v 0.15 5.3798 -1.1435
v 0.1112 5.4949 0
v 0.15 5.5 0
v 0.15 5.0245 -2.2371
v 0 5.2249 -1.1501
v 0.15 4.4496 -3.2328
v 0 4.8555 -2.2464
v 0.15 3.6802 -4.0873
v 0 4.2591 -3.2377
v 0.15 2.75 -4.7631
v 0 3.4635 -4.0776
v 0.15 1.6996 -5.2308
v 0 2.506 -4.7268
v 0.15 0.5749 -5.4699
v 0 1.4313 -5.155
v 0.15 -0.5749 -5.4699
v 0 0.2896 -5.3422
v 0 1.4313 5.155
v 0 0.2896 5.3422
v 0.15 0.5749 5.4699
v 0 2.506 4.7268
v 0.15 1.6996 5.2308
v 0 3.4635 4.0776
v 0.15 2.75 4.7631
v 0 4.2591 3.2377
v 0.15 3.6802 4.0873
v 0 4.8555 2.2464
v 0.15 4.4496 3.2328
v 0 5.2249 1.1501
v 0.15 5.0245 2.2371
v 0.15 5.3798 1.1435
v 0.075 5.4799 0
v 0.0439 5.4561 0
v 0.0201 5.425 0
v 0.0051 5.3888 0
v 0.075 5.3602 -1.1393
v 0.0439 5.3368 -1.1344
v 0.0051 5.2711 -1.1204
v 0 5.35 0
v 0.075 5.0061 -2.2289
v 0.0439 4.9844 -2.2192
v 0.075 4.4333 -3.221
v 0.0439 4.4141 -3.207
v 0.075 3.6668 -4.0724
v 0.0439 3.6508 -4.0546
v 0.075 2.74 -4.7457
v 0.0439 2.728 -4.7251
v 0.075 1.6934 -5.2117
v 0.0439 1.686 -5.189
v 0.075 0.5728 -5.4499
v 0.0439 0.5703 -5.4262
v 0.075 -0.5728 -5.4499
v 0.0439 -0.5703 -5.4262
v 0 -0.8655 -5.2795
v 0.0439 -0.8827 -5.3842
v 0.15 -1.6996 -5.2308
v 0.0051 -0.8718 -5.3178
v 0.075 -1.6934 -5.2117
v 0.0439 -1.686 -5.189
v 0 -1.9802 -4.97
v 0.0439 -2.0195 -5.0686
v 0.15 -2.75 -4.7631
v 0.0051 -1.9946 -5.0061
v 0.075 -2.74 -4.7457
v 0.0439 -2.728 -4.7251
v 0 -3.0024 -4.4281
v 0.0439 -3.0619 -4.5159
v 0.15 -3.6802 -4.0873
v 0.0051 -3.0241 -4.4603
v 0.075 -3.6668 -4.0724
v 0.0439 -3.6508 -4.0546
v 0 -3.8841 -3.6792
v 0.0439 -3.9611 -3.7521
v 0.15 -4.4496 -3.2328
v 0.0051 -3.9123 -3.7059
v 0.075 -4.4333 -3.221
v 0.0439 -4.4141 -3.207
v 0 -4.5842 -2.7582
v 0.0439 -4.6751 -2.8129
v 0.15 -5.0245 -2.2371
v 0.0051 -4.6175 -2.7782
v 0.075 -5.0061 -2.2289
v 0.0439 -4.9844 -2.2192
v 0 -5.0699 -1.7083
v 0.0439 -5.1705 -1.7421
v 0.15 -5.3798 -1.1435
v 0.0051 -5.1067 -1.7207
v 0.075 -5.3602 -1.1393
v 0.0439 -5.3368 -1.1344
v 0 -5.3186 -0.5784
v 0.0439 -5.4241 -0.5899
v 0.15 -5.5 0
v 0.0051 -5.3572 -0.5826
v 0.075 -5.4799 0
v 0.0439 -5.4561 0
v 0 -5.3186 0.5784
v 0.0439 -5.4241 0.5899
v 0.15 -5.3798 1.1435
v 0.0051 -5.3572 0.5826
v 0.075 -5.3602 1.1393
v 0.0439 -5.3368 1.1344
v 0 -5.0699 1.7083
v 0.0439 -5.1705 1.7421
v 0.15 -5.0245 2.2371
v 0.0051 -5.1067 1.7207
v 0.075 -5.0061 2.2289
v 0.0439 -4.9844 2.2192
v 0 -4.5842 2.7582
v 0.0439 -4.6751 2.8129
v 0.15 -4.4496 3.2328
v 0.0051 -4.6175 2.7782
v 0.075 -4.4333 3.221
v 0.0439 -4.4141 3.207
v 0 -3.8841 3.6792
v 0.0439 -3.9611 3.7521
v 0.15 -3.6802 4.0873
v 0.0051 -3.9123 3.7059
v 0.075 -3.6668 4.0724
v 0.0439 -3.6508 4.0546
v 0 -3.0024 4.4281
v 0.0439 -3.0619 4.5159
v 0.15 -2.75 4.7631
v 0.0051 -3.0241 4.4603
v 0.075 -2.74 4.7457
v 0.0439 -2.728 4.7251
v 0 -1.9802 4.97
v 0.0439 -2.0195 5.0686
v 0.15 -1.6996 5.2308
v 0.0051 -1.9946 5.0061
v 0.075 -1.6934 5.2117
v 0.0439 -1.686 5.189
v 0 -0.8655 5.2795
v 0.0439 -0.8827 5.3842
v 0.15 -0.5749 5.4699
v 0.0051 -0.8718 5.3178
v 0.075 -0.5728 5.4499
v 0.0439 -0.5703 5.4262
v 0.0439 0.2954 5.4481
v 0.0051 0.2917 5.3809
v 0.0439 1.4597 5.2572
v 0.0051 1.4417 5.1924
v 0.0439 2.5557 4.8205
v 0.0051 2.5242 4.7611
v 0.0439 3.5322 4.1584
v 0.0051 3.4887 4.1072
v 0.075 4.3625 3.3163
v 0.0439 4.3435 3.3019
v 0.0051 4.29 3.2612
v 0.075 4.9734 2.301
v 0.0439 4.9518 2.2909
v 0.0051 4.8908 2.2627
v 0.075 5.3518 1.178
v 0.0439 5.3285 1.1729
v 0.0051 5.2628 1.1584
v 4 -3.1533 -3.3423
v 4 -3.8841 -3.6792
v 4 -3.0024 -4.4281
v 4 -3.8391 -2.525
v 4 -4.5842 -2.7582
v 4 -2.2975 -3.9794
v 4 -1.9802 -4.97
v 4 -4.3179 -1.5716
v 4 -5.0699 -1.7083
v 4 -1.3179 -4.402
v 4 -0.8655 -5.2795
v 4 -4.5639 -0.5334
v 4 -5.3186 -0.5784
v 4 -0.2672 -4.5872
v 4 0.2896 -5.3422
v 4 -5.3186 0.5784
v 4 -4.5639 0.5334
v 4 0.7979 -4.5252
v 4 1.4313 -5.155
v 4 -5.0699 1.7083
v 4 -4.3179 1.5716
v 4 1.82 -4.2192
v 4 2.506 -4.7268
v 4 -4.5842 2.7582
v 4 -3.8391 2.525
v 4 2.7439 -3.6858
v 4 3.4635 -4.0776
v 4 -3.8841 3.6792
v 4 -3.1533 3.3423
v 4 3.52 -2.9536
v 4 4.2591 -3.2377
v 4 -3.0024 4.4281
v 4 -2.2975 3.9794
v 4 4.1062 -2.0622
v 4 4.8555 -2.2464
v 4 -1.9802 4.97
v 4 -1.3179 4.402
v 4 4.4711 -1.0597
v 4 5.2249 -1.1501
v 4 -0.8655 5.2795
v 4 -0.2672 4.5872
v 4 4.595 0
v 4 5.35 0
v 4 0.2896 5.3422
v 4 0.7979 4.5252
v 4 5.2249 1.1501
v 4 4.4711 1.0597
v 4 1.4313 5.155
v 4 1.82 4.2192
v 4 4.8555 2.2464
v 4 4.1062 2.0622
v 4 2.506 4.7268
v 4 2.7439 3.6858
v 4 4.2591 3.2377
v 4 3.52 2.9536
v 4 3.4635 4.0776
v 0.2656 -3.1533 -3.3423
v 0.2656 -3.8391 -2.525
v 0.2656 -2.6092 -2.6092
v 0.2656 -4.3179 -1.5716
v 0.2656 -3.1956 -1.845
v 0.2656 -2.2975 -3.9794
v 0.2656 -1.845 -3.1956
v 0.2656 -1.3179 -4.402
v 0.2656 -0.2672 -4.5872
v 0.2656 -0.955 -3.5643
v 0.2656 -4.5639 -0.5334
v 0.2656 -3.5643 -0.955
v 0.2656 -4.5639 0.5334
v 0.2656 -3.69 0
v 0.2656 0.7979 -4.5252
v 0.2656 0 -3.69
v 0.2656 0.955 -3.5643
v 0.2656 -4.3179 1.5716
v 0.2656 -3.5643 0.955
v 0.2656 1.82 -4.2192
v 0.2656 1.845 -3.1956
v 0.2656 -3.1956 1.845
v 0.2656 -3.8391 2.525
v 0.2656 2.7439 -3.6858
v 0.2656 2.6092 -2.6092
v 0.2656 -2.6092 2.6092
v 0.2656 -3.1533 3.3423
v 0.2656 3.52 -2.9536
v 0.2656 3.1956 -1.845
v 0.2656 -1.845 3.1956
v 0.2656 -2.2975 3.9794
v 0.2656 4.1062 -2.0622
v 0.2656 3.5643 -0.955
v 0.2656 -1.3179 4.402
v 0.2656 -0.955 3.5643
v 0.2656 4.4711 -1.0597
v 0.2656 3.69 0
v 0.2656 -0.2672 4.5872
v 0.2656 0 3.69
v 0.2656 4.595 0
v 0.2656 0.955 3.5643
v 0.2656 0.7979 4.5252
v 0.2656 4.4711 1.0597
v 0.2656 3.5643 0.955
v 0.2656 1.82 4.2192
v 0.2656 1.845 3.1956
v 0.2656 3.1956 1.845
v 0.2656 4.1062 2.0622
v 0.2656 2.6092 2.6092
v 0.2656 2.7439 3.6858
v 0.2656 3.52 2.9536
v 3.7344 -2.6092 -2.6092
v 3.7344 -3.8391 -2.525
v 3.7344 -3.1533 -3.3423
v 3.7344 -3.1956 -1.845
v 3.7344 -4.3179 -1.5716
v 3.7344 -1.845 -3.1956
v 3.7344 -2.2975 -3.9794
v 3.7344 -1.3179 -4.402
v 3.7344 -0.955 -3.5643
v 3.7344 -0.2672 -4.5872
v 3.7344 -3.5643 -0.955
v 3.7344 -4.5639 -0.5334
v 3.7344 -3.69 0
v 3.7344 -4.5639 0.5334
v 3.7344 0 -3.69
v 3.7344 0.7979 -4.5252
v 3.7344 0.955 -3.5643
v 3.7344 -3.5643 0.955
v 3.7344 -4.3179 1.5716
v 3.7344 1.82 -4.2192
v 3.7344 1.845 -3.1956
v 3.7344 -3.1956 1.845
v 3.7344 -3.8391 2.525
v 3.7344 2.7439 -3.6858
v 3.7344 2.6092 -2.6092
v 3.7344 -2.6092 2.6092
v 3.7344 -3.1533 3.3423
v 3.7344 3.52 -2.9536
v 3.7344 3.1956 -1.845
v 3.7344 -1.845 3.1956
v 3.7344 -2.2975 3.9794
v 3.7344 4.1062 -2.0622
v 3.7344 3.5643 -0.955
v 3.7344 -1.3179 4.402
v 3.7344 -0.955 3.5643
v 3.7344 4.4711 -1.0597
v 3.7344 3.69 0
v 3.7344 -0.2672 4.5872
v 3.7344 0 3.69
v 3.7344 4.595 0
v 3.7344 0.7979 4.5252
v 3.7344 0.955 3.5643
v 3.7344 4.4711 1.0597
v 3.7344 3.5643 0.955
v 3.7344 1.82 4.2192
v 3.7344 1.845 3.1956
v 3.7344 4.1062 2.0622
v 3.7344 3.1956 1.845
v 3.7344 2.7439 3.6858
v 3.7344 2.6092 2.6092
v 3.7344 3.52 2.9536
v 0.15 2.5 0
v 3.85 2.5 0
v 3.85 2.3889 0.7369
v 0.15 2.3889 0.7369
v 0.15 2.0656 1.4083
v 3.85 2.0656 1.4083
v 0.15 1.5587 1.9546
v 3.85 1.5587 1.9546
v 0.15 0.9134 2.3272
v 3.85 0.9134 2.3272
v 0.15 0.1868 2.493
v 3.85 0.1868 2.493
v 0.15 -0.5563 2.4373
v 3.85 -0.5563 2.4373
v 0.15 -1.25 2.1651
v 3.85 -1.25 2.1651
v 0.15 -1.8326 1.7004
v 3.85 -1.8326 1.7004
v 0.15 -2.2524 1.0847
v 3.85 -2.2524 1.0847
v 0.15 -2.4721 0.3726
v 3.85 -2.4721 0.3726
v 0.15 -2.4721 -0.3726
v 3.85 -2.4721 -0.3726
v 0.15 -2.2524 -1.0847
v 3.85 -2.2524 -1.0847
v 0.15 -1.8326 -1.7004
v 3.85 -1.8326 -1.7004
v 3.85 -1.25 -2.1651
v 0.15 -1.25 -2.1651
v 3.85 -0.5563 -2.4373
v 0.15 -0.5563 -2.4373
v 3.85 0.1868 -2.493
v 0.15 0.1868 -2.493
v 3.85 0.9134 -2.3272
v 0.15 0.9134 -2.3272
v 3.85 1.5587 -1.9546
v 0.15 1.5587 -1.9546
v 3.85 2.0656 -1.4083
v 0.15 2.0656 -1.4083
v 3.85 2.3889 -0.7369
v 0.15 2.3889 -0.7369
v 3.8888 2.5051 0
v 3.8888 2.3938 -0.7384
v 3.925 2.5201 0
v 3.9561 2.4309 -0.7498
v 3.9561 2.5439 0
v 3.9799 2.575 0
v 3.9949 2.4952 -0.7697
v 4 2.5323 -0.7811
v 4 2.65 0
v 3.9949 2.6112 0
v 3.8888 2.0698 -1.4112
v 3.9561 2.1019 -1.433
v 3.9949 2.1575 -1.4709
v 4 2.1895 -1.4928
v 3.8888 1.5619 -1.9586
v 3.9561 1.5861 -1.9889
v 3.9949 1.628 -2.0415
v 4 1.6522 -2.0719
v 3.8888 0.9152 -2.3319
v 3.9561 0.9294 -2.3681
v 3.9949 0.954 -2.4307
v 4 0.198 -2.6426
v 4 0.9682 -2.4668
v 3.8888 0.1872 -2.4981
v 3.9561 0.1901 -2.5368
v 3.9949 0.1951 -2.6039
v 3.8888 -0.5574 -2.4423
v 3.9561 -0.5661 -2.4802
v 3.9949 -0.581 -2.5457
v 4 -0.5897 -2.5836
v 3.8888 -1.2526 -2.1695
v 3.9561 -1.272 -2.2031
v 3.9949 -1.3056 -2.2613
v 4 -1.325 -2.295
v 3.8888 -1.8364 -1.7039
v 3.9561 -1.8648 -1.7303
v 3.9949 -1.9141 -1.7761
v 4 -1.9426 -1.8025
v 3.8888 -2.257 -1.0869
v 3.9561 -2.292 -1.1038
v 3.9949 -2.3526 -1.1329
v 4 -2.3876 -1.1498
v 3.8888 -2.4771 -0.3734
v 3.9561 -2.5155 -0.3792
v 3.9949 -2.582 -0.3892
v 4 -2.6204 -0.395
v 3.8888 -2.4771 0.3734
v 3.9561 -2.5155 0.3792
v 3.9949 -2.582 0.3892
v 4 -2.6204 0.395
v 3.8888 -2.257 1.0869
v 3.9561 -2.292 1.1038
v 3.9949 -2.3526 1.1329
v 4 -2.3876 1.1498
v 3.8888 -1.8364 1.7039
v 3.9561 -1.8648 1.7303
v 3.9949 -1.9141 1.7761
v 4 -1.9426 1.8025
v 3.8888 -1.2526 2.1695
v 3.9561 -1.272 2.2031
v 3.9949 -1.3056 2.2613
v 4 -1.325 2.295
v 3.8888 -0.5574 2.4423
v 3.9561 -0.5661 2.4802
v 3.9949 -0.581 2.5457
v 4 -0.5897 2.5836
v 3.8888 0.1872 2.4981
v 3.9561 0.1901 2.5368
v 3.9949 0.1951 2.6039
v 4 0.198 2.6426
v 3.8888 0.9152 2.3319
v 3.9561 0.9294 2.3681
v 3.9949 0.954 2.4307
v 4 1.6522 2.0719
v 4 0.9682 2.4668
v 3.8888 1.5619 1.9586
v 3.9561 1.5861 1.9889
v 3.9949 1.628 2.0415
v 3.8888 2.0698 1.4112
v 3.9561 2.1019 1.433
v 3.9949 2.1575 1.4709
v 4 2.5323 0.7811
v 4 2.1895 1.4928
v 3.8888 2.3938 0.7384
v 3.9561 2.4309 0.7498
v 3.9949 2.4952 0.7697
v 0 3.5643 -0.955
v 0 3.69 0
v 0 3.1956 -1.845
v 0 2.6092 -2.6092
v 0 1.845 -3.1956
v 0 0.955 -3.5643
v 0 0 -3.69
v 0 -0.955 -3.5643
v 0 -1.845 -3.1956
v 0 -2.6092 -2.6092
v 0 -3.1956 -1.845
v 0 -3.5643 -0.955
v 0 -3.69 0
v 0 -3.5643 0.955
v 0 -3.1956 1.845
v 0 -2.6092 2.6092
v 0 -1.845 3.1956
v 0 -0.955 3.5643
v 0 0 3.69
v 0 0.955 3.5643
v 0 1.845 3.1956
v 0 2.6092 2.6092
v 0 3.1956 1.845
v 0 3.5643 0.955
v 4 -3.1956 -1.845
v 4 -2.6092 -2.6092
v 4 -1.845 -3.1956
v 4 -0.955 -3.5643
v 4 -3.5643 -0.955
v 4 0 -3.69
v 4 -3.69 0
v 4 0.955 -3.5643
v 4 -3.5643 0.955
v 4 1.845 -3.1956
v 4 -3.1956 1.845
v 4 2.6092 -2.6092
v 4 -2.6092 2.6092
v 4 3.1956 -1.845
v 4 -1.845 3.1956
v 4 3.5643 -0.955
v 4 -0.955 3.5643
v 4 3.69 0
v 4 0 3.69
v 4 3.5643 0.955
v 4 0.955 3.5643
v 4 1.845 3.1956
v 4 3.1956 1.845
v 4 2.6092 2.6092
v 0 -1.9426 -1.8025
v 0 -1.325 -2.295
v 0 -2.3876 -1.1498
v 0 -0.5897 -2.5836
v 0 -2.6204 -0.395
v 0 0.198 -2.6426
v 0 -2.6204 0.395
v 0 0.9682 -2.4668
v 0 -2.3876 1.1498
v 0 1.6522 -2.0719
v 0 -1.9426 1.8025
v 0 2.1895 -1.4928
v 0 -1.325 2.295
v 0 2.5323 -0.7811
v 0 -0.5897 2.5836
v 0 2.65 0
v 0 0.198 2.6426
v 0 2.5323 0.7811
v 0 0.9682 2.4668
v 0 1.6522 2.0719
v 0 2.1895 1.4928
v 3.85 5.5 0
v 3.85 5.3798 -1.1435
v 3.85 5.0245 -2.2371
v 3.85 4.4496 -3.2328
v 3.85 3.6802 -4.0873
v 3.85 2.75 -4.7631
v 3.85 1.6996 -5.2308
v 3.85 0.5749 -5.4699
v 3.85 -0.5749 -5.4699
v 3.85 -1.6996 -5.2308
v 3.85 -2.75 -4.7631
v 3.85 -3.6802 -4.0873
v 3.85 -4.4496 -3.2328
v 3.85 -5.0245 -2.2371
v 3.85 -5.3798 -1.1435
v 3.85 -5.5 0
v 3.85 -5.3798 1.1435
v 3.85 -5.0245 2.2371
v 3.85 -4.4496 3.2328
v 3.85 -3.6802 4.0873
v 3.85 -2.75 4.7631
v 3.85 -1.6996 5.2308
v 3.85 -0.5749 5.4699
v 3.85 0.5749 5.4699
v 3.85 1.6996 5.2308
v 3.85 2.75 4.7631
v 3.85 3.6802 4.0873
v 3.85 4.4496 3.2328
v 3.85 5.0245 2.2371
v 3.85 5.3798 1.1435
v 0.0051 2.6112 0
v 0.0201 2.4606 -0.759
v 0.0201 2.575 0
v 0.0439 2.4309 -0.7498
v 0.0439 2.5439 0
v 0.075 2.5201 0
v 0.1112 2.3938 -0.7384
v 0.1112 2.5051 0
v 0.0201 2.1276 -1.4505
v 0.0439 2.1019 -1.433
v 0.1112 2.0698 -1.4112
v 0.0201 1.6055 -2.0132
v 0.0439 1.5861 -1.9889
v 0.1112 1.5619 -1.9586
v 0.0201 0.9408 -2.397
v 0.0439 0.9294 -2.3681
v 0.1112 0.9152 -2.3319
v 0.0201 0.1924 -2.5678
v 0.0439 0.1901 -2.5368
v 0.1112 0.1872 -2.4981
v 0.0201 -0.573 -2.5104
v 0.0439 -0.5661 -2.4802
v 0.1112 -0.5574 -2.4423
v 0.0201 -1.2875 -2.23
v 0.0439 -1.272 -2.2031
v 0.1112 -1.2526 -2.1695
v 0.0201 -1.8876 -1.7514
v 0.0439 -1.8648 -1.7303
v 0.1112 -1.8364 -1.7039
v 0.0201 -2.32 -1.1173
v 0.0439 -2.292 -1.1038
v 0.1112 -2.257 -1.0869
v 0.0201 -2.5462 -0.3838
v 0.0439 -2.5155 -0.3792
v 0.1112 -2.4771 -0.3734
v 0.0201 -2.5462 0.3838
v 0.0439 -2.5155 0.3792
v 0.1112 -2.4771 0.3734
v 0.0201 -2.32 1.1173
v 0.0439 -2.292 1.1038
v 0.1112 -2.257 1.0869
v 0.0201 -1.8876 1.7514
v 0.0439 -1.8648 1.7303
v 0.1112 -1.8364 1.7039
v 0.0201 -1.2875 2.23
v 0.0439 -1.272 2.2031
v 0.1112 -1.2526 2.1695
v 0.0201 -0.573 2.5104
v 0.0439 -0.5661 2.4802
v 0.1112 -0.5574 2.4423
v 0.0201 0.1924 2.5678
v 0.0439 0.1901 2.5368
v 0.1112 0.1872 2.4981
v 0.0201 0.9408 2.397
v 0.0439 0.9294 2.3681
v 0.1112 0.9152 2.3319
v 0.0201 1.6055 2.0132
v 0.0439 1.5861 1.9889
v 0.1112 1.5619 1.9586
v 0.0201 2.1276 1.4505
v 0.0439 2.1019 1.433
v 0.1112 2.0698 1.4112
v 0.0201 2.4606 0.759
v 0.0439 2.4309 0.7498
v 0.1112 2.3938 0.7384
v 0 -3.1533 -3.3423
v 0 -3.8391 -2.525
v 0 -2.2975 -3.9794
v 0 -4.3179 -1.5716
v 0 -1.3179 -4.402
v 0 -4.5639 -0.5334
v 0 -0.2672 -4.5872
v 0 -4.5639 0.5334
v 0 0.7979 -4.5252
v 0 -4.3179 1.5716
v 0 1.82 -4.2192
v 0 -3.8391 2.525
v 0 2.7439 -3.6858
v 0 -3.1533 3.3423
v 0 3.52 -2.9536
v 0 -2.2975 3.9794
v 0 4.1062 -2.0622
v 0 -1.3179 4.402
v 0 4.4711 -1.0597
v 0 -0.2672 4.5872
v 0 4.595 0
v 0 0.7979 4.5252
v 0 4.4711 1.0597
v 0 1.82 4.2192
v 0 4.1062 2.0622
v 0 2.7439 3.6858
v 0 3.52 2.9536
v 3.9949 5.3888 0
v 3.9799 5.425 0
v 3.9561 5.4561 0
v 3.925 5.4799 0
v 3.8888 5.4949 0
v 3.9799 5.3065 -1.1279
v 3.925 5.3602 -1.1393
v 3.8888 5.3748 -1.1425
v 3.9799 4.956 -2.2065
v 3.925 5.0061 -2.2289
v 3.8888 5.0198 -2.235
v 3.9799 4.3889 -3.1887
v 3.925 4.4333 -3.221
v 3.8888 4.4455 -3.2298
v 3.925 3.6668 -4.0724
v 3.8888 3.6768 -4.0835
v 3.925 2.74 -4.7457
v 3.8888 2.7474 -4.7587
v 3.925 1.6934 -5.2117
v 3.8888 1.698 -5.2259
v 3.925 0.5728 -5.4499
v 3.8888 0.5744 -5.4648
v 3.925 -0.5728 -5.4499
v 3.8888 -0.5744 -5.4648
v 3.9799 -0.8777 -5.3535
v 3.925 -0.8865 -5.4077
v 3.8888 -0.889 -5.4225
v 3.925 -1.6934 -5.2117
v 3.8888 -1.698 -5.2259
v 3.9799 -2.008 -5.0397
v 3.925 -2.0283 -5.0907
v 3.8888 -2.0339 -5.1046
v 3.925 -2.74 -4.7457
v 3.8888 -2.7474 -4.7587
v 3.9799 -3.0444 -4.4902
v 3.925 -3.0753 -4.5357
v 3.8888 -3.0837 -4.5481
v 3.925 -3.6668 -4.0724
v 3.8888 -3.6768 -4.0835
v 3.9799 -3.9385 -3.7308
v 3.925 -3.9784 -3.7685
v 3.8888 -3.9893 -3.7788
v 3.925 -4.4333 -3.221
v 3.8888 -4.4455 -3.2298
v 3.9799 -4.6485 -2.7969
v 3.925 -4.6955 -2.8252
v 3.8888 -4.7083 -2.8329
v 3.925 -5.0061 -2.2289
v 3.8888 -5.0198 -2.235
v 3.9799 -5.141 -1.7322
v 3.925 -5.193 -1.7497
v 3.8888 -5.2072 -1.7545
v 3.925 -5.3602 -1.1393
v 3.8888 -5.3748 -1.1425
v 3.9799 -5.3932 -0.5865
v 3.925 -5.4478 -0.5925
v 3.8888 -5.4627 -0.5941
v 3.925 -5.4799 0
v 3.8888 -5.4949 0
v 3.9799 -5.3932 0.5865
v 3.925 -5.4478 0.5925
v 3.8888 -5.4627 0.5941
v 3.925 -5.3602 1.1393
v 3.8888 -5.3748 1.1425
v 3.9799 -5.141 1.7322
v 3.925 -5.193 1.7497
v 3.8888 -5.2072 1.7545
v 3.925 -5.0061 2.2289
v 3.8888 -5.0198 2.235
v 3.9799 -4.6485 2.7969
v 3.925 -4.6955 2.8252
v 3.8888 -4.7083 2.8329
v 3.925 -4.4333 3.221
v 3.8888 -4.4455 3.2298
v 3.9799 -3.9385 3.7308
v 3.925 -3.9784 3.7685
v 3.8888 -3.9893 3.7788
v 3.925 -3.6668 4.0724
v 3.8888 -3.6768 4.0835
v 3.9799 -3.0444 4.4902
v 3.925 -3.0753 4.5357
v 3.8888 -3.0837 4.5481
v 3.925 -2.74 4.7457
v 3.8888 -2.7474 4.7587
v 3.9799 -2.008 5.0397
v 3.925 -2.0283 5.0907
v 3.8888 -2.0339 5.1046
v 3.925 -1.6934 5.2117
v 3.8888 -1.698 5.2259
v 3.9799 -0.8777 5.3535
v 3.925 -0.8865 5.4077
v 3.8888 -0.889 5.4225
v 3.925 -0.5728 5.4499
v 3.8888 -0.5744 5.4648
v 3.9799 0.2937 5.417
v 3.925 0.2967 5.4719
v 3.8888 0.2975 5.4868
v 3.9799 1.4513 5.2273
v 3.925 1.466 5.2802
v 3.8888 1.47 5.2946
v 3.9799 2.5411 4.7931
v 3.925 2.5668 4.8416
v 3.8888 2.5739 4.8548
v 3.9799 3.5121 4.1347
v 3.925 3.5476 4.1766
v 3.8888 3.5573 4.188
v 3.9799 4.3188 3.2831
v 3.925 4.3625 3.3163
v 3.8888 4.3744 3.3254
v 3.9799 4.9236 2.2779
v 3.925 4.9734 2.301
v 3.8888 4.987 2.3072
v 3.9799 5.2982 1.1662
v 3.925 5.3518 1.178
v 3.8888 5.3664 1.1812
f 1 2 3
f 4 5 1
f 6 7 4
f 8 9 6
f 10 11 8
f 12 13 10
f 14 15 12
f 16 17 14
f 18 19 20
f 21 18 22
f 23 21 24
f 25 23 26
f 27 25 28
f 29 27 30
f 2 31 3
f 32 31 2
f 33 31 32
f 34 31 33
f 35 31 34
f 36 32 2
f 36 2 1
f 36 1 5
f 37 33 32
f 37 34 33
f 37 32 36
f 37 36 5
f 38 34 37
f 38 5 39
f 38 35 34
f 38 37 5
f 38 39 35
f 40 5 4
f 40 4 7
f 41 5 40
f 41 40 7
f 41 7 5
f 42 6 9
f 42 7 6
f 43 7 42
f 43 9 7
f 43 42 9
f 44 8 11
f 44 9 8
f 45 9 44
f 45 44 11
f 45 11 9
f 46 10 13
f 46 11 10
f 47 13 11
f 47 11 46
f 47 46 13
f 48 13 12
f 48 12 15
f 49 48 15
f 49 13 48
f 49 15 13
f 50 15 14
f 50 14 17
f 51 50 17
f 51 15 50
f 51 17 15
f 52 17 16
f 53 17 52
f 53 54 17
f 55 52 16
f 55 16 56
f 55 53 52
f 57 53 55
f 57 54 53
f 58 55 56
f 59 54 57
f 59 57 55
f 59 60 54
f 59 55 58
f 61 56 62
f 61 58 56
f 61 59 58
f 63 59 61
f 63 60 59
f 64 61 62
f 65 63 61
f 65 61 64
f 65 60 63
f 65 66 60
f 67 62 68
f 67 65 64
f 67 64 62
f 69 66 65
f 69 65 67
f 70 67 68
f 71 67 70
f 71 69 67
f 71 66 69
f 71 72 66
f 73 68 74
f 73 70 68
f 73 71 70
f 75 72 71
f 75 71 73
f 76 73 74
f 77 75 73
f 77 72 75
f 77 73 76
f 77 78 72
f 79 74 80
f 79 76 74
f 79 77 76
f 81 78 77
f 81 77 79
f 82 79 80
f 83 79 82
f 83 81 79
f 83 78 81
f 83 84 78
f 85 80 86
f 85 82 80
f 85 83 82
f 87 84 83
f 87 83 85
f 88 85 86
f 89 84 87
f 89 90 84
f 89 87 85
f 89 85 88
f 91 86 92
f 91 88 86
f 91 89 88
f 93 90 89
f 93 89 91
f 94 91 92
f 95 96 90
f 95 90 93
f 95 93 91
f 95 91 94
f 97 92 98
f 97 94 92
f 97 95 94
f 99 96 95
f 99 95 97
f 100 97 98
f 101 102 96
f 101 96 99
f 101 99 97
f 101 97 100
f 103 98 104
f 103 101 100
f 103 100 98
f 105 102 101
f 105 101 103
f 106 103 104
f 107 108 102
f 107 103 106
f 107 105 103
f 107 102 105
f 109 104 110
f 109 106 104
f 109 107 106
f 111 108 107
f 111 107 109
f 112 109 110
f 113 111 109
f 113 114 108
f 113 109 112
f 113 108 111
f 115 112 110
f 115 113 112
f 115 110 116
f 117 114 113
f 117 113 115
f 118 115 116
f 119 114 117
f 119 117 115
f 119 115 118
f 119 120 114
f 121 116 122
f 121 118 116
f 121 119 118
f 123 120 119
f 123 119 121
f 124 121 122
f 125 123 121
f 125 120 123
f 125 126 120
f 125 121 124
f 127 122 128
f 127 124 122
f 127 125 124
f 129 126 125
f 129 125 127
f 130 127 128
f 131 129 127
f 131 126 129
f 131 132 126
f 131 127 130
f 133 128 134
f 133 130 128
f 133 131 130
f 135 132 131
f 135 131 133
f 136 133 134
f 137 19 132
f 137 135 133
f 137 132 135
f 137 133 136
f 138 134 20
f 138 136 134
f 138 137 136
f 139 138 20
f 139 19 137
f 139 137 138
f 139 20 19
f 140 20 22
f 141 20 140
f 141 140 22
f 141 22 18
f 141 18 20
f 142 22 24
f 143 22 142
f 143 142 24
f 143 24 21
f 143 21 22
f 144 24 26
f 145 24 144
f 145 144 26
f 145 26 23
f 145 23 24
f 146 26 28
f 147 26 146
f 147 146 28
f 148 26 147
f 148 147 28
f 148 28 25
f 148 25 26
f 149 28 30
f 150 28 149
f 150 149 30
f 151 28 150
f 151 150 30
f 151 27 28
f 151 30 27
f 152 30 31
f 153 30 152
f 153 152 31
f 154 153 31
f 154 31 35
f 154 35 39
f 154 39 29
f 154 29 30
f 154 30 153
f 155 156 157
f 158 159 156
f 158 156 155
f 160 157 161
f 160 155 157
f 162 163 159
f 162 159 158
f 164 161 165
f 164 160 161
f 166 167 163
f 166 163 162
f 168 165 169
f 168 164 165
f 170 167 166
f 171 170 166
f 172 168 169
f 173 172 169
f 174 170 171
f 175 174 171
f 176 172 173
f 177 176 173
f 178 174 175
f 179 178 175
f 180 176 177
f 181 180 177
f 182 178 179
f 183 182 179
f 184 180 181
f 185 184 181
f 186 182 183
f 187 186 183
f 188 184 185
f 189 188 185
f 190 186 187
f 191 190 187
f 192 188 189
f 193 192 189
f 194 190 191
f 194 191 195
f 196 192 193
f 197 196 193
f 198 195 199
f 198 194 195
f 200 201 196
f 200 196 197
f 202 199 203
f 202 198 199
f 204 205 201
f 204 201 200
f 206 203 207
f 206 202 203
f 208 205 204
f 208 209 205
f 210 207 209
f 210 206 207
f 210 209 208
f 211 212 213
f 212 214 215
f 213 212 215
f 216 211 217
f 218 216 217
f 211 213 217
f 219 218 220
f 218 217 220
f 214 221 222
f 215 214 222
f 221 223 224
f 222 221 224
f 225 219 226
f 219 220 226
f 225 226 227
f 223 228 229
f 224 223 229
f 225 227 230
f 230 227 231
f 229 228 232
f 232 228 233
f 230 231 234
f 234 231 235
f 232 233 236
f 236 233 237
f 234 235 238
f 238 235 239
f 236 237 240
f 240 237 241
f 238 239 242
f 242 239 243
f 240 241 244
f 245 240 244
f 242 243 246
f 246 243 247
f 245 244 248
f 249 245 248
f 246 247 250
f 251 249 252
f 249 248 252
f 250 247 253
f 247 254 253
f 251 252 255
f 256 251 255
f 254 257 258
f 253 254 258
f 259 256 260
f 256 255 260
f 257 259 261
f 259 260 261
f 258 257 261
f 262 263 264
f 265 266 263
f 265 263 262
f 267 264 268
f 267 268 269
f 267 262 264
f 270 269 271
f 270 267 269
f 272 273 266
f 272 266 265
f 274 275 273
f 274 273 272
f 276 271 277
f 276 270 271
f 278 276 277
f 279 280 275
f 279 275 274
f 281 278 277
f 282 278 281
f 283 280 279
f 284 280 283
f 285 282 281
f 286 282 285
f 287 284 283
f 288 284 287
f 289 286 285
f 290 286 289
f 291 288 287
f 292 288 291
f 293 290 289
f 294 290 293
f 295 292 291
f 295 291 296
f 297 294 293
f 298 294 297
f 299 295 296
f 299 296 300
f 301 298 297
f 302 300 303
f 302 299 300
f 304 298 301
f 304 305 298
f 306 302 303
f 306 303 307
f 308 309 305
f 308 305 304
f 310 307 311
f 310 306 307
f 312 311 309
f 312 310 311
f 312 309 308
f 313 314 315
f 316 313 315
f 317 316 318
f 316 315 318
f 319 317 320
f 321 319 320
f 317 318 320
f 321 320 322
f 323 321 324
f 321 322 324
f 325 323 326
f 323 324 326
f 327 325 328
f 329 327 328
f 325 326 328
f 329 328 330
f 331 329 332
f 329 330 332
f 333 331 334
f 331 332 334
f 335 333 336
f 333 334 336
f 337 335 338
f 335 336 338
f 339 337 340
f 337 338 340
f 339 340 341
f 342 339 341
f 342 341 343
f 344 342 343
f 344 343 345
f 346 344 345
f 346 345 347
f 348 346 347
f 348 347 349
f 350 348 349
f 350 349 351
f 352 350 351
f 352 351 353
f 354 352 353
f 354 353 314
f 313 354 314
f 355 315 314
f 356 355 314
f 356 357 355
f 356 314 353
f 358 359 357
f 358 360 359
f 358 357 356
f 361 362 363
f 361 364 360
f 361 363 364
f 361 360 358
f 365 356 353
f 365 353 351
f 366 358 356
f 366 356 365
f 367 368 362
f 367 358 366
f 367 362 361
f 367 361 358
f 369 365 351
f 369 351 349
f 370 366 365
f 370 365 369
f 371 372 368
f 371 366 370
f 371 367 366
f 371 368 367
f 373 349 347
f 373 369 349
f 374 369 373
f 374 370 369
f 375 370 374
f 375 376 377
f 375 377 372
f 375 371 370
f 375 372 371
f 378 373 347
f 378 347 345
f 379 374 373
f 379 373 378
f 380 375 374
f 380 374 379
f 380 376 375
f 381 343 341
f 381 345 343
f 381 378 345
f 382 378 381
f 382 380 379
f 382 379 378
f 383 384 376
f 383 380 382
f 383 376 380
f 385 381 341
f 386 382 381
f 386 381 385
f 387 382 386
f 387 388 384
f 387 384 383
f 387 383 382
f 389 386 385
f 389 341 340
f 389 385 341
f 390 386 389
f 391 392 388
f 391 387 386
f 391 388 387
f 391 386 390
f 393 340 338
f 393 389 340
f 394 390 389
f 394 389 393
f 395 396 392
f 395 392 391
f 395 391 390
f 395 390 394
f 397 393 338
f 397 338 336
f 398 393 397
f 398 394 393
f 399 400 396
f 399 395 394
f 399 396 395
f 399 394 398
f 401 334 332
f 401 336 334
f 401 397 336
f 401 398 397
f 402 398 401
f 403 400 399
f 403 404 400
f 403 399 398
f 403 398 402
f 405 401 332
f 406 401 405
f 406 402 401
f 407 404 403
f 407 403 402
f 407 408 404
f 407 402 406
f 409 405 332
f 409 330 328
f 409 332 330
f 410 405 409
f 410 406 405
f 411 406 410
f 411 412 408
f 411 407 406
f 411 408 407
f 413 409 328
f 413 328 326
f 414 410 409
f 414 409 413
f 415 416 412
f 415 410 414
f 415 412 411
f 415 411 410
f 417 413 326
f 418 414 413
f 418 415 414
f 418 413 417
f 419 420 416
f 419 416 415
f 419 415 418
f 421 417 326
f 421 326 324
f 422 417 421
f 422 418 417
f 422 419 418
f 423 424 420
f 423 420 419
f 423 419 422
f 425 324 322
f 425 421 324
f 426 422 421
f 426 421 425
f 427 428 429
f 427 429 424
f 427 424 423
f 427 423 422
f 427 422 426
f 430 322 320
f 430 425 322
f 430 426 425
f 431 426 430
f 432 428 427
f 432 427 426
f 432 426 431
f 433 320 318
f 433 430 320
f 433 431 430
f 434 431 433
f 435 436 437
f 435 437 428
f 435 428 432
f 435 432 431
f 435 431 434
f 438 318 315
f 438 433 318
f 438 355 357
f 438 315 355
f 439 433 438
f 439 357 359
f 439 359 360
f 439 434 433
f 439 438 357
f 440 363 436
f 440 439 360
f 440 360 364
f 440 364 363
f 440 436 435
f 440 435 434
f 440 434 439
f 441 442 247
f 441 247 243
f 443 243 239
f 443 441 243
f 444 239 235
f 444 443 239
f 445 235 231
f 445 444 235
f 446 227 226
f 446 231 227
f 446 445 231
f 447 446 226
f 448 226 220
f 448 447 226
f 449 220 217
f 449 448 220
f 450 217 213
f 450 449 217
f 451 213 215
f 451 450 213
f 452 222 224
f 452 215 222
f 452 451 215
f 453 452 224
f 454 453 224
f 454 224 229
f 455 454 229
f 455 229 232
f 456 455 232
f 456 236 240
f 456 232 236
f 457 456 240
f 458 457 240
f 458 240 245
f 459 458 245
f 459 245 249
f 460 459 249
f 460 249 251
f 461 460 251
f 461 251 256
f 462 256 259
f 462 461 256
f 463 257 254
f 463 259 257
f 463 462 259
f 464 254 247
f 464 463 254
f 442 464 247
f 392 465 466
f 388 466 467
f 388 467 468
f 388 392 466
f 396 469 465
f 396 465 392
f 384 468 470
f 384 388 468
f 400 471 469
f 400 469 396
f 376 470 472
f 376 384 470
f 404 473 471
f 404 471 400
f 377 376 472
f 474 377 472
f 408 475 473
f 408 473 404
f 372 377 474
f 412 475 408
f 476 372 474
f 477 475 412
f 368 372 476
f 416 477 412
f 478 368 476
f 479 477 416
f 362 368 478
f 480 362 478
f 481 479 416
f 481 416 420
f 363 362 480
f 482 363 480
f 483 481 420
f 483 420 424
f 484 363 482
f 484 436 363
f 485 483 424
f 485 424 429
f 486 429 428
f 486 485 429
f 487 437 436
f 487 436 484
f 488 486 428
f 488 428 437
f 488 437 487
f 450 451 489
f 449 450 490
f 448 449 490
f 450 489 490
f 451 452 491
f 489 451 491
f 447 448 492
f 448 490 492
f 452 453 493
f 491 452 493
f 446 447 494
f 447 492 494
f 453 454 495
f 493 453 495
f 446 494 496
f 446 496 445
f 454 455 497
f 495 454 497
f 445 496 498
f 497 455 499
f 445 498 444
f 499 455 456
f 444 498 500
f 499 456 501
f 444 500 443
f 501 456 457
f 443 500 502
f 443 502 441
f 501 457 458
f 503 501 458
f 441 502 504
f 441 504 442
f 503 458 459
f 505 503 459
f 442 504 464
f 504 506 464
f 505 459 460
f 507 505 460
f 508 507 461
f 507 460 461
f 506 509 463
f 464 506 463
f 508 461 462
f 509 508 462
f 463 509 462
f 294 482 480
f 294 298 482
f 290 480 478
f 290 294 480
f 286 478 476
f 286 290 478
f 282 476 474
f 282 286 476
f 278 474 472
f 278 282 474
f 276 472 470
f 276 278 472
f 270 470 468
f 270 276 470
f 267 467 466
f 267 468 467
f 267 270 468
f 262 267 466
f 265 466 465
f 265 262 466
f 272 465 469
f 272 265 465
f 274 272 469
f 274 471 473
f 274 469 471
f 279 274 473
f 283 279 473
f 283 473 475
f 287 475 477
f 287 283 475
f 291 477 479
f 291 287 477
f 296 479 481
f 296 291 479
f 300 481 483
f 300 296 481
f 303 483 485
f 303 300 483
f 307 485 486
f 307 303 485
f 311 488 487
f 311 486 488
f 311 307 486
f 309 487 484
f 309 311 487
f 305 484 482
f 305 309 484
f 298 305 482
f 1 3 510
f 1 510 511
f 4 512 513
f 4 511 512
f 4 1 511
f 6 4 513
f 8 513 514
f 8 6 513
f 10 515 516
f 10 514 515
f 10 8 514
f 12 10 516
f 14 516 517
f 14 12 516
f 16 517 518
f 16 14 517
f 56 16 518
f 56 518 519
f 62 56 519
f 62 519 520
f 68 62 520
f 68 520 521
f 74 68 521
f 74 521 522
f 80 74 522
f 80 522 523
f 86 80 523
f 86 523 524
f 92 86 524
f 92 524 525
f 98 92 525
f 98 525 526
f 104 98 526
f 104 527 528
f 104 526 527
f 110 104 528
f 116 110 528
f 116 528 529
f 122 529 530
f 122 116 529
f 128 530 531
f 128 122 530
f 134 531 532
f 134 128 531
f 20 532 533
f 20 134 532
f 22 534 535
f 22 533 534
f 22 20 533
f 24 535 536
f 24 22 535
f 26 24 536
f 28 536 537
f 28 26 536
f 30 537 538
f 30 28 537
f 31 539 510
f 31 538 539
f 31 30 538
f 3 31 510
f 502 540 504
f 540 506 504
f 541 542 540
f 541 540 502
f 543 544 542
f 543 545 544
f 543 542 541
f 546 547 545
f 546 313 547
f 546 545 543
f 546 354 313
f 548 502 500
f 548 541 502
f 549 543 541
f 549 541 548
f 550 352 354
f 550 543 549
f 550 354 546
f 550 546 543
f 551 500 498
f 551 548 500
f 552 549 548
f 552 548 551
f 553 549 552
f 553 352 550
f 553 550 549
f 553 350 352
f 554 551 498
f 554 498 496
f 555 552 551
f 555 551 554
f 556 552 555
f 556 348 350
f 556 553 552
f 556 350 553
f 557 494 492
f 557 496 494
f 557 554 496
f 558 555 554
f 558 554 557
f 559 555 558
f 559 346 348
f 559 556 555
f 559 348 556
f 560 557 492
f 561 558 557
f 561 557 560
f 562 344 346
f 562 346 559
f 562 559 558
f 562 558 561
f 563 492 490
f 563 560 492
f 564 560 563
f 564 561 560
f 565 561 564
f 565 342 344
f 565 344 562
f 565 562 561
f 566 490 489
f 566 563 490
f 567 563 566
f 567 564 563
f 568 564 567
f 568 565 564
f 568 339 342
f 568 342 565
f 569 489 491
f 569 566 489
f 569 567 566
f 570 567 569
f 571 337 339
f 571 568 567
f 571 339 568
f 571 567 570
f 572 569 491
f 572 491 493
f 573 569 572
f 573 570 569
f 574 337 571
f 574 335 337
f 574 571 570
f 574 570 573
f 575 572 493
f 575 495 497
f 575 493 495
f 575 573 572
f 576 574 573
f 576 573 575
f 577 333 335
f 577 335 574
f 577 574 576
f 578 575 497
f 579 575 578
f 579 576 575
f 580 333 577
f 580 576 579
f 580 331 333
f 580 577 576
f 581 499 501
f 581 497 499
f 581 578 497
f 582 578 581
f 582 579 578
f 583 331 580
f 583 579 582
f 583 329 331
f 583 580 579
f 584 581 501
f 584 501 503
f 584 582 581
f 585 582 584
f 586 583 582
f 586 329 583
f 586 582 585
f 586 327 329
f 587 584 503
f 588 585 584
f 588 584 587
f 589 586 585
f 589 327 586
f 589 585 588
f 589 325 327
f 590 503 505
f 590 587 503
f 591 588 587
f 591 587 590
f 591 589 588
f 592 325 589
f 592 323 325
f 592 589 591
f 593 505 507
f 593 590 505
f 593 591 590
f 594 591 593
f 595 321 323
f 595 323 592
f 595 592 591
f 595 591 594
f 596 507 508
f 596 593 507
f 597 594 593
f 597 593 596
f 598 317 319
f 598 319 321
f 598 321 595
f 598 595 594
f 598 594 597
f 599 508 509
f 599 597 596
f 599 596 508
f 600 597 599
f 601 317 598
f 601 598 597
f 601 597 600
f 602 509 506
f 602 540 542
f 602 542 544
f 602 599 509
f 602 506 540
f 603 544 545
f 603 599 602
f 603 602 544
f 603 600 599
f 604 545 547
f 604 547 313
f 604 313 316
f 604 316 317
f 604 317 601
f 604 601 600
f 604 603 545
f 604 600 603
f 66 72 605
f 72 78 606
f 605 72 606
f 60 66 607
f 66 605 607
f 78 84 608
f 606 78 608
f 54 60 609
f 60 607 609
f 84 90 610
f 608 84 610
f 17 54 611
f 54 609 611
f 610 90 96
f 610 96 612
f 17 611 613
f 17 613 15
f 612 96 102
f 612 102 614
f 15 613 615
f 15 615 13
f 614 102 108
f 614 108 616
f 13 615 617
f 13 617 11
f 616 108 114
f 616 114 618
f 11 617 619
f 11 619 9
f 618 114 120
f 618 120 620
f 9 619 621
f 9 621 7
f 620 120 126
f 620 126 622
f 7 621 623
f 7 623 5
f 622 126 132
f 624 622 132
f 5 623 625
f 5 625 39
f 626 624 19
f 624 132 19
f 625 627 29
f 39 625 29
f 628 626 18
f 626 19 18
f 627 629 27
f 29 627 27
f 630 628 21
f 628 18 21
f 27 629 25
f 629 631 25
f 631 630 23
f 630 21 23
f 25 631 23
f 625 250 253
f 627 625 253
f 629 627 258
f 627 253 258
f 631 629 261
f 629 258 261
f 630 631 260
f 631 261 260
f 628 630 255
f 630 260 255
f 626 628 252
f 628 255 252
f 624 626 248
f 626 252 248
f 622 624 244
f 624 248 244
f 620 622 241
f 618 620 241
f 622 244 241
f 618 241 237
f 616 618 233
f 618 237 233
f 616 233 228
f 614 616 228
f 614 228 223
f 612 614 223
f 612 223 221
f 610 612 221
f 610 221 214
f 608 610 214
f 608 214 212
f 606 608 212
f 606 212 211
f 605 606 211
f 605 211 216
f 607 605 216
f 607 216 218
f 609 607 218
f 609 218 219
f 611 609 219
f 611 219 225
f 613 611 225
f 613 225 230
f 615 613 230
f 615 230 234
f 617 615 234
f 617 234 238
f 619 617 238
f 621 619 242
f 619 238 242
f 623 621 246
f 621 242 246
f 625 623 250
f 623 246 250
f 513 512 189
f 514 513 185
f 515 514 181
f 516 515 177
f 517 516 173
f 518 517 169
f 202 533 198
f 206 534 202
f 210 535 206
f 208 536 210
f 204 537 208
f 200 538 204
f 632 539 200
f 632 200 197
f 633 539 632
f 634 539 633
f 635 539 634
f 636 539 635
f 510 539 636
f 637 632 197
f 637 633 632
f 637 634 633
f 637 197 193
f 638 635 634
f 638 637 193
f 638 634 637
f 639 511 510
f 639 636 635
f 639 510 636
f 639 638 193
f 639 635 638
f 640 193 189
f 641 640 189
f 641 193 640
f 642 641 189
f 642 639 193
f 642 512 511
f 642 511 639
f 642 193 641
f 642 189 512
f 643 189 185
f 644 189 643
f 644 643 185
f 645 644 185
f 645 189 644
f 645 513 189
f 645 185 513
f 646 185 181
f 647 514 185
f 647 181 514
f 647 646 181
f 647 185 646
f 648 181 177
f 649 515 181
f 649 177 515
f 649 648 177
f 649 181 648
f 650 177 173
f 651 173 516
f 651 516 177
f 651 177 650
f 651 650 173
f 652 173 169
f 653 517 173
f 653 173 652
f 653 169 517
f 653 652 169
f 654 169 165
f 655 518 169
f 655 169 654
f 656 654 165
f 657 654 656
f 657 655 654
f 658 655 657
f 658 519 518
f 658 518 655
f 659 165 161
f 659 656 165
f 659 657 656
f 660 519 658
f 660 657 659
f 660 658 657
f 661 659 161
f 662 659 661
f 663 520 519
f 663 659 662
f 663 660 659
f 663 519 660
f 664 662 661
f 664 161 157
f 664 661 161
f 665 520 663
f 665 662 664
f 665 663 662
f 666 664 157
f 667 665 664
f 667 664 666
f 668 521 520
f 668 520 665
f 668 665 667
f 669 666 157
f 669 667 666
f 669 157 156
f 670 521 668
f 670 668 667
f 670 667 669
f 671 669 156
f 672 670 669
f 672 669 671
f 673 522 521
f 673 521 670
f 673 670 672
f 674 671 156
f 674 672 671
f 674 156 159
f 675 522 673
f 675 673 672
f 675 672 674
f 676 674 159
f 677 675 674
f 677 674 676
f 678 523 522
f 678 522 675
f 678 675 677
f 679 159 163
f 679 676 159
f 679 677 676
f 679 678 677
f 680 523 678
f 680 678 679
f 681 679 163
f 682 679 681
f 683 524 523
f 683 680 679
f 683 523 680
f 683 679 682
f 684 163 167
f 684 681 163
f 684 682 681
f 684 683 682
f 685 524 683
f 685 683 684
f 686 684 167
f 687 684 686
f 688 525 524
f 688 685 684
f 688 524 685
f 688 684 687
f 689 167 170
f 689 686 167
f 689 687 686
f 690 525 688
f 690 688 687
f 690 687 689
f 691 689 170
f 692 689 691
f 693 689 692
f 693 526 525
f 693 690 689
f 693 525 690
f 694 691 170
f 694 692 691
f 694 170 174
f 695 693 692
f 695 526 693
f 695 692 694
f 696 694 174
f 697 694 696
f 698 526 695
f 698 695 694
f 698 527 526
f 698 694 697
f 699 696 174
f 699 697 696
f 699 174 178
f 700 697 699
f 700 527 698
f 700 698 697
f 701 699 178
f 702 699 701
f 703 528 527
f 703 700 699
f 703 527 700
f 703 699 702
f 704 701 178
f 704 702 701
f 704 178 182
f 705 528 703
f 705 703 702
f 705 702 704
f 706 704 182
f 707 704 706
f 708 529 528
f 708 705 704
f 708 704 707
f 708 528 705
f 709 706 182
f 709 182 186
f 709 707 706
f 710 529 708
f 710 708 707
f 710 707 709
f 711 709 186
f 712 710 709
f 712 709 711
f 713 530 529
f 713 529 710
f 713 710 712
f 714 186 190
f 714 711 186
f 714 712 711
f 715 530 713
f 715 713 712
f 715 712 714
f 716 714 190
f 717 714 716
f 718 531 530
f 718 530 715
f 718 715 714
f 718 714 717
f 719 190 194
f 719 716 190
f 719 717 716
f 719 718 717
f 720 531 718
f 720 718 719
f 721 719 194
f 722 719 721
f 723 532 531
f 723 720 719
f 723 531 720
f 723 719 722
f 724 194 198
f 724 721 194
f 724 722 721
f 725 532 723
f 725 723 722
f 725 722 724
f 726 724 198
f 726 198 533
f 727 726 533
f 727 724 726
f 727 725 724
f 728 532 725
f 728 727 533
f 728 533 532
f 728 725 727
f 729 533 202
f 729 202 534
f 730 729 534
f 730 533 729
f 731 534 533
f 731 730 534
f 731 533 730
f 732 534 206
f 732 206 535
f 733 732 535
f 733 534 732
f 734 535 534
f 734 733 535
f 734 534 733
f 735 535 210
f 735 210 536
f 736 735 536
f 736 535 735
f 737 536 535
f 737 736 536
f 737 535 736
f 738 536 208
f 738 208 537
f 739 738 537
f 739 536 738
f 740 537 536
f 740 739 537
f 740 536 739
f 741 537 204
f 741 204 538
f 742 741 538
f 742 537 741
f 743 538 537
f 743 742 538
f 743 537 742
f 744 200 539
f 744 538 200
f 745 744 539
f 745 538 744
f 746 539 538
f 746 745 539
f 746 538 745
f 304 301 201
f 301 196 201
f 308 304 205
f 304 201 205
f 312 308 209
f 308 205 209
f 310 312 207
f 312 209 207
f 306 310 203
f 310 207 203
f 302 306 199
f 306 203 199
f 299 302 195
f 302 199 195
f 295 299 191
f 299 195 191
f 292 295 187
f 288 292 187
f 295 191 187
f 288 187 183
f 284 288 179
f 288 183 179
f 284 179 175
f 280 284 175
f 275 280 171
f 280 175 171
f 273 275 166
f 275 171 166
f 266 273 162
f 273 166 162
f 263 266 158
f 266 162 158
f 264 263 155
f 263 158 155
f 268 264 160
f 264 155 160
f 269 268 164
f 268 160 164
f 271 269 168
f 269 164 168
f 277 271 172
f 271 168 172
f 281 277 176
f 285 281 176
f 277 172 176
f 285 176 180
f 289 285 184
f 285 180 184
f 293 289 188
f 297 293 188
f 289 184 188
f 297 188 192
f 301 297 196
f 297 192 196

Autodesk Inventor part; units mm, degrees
sketch "Sketch_1" plane through (0, 0, 0) normal (0, 0, 1) x (1, 0, 0)
  line L0 (3.85, 0) -> (0.15, 0)
  arc A0 (0, 2.65) -> (0.15, 2.5) centre (0.15, 2.65) ccw
  line L1 (0.15, 2.5) -> (3.85, 2.5)
  arc A1 (3.85, 2.5) -> (4, 2.65) centre (3.85, 2.65) ccw
  line L2 (4, 2.65) -> (4, 3.69)
  line L3 (4, 3.69) -> (3.7344, 3.69)
  line L4 (3.7344, 3.69) -> (3.7344, 4.595)
  line L5 (3.7344, 4.595) -> (4, 4.595)
  line L6 (4, 4.595) -> (4, 5.35)
  arc A2 (4, 5.35) -> (3.85, 5.5) centre (3.85, 5.35) ccw
  line L7 (3.85, 5.5) -> (0.15, 5.5)
  arc A3 (0.15, 5.5) -> (0, 5.35) centre (0.15, 5.35) ccw
  line L8 (0, 5.35) -> (0, 4.595)
  line L9 (0, 4.595) -> (0.2656, 4.595)
  line L10 (0.2656, 4.595) -> (0.2656, 3.69)
  line L11 (0.2656, 3.69) -> (0, 3.69)
  line L12 (0, 3.69) -> (0, 2.65)
revolve "Revolution1" add sketch "Sketch_1" angle 360 about axis through (3.85, 0, 0) along (1, 0, 0)
ref_plane "to_housing_XY" through (0, 0, 0) normal (1, 0, 0) x (0, 0, -1)
ref_plane "to_housing_YZ" through (0, 0, 0) normal (0, 0, -1) x (0, 1, 0)
ref_plane "to_housing_ZX" through (0, 0, 0) normal (0, 1, 0) x (1, 0, 0)
ref_plane "to_housing_center_XY" through (2, 0, 0) normal (1, 0, 0) x (0, 0, -1)
ref_plane "to_housing_center_YZ" through (2, 0, 0) normal (0, 0, -1) x (0, 1, 0)
ref_plane "to_housing_center_ZX" through (2, 0, 0) normal (0, 1, 0) x (1, 0, 0)
properties part number "BR115ZZ"
